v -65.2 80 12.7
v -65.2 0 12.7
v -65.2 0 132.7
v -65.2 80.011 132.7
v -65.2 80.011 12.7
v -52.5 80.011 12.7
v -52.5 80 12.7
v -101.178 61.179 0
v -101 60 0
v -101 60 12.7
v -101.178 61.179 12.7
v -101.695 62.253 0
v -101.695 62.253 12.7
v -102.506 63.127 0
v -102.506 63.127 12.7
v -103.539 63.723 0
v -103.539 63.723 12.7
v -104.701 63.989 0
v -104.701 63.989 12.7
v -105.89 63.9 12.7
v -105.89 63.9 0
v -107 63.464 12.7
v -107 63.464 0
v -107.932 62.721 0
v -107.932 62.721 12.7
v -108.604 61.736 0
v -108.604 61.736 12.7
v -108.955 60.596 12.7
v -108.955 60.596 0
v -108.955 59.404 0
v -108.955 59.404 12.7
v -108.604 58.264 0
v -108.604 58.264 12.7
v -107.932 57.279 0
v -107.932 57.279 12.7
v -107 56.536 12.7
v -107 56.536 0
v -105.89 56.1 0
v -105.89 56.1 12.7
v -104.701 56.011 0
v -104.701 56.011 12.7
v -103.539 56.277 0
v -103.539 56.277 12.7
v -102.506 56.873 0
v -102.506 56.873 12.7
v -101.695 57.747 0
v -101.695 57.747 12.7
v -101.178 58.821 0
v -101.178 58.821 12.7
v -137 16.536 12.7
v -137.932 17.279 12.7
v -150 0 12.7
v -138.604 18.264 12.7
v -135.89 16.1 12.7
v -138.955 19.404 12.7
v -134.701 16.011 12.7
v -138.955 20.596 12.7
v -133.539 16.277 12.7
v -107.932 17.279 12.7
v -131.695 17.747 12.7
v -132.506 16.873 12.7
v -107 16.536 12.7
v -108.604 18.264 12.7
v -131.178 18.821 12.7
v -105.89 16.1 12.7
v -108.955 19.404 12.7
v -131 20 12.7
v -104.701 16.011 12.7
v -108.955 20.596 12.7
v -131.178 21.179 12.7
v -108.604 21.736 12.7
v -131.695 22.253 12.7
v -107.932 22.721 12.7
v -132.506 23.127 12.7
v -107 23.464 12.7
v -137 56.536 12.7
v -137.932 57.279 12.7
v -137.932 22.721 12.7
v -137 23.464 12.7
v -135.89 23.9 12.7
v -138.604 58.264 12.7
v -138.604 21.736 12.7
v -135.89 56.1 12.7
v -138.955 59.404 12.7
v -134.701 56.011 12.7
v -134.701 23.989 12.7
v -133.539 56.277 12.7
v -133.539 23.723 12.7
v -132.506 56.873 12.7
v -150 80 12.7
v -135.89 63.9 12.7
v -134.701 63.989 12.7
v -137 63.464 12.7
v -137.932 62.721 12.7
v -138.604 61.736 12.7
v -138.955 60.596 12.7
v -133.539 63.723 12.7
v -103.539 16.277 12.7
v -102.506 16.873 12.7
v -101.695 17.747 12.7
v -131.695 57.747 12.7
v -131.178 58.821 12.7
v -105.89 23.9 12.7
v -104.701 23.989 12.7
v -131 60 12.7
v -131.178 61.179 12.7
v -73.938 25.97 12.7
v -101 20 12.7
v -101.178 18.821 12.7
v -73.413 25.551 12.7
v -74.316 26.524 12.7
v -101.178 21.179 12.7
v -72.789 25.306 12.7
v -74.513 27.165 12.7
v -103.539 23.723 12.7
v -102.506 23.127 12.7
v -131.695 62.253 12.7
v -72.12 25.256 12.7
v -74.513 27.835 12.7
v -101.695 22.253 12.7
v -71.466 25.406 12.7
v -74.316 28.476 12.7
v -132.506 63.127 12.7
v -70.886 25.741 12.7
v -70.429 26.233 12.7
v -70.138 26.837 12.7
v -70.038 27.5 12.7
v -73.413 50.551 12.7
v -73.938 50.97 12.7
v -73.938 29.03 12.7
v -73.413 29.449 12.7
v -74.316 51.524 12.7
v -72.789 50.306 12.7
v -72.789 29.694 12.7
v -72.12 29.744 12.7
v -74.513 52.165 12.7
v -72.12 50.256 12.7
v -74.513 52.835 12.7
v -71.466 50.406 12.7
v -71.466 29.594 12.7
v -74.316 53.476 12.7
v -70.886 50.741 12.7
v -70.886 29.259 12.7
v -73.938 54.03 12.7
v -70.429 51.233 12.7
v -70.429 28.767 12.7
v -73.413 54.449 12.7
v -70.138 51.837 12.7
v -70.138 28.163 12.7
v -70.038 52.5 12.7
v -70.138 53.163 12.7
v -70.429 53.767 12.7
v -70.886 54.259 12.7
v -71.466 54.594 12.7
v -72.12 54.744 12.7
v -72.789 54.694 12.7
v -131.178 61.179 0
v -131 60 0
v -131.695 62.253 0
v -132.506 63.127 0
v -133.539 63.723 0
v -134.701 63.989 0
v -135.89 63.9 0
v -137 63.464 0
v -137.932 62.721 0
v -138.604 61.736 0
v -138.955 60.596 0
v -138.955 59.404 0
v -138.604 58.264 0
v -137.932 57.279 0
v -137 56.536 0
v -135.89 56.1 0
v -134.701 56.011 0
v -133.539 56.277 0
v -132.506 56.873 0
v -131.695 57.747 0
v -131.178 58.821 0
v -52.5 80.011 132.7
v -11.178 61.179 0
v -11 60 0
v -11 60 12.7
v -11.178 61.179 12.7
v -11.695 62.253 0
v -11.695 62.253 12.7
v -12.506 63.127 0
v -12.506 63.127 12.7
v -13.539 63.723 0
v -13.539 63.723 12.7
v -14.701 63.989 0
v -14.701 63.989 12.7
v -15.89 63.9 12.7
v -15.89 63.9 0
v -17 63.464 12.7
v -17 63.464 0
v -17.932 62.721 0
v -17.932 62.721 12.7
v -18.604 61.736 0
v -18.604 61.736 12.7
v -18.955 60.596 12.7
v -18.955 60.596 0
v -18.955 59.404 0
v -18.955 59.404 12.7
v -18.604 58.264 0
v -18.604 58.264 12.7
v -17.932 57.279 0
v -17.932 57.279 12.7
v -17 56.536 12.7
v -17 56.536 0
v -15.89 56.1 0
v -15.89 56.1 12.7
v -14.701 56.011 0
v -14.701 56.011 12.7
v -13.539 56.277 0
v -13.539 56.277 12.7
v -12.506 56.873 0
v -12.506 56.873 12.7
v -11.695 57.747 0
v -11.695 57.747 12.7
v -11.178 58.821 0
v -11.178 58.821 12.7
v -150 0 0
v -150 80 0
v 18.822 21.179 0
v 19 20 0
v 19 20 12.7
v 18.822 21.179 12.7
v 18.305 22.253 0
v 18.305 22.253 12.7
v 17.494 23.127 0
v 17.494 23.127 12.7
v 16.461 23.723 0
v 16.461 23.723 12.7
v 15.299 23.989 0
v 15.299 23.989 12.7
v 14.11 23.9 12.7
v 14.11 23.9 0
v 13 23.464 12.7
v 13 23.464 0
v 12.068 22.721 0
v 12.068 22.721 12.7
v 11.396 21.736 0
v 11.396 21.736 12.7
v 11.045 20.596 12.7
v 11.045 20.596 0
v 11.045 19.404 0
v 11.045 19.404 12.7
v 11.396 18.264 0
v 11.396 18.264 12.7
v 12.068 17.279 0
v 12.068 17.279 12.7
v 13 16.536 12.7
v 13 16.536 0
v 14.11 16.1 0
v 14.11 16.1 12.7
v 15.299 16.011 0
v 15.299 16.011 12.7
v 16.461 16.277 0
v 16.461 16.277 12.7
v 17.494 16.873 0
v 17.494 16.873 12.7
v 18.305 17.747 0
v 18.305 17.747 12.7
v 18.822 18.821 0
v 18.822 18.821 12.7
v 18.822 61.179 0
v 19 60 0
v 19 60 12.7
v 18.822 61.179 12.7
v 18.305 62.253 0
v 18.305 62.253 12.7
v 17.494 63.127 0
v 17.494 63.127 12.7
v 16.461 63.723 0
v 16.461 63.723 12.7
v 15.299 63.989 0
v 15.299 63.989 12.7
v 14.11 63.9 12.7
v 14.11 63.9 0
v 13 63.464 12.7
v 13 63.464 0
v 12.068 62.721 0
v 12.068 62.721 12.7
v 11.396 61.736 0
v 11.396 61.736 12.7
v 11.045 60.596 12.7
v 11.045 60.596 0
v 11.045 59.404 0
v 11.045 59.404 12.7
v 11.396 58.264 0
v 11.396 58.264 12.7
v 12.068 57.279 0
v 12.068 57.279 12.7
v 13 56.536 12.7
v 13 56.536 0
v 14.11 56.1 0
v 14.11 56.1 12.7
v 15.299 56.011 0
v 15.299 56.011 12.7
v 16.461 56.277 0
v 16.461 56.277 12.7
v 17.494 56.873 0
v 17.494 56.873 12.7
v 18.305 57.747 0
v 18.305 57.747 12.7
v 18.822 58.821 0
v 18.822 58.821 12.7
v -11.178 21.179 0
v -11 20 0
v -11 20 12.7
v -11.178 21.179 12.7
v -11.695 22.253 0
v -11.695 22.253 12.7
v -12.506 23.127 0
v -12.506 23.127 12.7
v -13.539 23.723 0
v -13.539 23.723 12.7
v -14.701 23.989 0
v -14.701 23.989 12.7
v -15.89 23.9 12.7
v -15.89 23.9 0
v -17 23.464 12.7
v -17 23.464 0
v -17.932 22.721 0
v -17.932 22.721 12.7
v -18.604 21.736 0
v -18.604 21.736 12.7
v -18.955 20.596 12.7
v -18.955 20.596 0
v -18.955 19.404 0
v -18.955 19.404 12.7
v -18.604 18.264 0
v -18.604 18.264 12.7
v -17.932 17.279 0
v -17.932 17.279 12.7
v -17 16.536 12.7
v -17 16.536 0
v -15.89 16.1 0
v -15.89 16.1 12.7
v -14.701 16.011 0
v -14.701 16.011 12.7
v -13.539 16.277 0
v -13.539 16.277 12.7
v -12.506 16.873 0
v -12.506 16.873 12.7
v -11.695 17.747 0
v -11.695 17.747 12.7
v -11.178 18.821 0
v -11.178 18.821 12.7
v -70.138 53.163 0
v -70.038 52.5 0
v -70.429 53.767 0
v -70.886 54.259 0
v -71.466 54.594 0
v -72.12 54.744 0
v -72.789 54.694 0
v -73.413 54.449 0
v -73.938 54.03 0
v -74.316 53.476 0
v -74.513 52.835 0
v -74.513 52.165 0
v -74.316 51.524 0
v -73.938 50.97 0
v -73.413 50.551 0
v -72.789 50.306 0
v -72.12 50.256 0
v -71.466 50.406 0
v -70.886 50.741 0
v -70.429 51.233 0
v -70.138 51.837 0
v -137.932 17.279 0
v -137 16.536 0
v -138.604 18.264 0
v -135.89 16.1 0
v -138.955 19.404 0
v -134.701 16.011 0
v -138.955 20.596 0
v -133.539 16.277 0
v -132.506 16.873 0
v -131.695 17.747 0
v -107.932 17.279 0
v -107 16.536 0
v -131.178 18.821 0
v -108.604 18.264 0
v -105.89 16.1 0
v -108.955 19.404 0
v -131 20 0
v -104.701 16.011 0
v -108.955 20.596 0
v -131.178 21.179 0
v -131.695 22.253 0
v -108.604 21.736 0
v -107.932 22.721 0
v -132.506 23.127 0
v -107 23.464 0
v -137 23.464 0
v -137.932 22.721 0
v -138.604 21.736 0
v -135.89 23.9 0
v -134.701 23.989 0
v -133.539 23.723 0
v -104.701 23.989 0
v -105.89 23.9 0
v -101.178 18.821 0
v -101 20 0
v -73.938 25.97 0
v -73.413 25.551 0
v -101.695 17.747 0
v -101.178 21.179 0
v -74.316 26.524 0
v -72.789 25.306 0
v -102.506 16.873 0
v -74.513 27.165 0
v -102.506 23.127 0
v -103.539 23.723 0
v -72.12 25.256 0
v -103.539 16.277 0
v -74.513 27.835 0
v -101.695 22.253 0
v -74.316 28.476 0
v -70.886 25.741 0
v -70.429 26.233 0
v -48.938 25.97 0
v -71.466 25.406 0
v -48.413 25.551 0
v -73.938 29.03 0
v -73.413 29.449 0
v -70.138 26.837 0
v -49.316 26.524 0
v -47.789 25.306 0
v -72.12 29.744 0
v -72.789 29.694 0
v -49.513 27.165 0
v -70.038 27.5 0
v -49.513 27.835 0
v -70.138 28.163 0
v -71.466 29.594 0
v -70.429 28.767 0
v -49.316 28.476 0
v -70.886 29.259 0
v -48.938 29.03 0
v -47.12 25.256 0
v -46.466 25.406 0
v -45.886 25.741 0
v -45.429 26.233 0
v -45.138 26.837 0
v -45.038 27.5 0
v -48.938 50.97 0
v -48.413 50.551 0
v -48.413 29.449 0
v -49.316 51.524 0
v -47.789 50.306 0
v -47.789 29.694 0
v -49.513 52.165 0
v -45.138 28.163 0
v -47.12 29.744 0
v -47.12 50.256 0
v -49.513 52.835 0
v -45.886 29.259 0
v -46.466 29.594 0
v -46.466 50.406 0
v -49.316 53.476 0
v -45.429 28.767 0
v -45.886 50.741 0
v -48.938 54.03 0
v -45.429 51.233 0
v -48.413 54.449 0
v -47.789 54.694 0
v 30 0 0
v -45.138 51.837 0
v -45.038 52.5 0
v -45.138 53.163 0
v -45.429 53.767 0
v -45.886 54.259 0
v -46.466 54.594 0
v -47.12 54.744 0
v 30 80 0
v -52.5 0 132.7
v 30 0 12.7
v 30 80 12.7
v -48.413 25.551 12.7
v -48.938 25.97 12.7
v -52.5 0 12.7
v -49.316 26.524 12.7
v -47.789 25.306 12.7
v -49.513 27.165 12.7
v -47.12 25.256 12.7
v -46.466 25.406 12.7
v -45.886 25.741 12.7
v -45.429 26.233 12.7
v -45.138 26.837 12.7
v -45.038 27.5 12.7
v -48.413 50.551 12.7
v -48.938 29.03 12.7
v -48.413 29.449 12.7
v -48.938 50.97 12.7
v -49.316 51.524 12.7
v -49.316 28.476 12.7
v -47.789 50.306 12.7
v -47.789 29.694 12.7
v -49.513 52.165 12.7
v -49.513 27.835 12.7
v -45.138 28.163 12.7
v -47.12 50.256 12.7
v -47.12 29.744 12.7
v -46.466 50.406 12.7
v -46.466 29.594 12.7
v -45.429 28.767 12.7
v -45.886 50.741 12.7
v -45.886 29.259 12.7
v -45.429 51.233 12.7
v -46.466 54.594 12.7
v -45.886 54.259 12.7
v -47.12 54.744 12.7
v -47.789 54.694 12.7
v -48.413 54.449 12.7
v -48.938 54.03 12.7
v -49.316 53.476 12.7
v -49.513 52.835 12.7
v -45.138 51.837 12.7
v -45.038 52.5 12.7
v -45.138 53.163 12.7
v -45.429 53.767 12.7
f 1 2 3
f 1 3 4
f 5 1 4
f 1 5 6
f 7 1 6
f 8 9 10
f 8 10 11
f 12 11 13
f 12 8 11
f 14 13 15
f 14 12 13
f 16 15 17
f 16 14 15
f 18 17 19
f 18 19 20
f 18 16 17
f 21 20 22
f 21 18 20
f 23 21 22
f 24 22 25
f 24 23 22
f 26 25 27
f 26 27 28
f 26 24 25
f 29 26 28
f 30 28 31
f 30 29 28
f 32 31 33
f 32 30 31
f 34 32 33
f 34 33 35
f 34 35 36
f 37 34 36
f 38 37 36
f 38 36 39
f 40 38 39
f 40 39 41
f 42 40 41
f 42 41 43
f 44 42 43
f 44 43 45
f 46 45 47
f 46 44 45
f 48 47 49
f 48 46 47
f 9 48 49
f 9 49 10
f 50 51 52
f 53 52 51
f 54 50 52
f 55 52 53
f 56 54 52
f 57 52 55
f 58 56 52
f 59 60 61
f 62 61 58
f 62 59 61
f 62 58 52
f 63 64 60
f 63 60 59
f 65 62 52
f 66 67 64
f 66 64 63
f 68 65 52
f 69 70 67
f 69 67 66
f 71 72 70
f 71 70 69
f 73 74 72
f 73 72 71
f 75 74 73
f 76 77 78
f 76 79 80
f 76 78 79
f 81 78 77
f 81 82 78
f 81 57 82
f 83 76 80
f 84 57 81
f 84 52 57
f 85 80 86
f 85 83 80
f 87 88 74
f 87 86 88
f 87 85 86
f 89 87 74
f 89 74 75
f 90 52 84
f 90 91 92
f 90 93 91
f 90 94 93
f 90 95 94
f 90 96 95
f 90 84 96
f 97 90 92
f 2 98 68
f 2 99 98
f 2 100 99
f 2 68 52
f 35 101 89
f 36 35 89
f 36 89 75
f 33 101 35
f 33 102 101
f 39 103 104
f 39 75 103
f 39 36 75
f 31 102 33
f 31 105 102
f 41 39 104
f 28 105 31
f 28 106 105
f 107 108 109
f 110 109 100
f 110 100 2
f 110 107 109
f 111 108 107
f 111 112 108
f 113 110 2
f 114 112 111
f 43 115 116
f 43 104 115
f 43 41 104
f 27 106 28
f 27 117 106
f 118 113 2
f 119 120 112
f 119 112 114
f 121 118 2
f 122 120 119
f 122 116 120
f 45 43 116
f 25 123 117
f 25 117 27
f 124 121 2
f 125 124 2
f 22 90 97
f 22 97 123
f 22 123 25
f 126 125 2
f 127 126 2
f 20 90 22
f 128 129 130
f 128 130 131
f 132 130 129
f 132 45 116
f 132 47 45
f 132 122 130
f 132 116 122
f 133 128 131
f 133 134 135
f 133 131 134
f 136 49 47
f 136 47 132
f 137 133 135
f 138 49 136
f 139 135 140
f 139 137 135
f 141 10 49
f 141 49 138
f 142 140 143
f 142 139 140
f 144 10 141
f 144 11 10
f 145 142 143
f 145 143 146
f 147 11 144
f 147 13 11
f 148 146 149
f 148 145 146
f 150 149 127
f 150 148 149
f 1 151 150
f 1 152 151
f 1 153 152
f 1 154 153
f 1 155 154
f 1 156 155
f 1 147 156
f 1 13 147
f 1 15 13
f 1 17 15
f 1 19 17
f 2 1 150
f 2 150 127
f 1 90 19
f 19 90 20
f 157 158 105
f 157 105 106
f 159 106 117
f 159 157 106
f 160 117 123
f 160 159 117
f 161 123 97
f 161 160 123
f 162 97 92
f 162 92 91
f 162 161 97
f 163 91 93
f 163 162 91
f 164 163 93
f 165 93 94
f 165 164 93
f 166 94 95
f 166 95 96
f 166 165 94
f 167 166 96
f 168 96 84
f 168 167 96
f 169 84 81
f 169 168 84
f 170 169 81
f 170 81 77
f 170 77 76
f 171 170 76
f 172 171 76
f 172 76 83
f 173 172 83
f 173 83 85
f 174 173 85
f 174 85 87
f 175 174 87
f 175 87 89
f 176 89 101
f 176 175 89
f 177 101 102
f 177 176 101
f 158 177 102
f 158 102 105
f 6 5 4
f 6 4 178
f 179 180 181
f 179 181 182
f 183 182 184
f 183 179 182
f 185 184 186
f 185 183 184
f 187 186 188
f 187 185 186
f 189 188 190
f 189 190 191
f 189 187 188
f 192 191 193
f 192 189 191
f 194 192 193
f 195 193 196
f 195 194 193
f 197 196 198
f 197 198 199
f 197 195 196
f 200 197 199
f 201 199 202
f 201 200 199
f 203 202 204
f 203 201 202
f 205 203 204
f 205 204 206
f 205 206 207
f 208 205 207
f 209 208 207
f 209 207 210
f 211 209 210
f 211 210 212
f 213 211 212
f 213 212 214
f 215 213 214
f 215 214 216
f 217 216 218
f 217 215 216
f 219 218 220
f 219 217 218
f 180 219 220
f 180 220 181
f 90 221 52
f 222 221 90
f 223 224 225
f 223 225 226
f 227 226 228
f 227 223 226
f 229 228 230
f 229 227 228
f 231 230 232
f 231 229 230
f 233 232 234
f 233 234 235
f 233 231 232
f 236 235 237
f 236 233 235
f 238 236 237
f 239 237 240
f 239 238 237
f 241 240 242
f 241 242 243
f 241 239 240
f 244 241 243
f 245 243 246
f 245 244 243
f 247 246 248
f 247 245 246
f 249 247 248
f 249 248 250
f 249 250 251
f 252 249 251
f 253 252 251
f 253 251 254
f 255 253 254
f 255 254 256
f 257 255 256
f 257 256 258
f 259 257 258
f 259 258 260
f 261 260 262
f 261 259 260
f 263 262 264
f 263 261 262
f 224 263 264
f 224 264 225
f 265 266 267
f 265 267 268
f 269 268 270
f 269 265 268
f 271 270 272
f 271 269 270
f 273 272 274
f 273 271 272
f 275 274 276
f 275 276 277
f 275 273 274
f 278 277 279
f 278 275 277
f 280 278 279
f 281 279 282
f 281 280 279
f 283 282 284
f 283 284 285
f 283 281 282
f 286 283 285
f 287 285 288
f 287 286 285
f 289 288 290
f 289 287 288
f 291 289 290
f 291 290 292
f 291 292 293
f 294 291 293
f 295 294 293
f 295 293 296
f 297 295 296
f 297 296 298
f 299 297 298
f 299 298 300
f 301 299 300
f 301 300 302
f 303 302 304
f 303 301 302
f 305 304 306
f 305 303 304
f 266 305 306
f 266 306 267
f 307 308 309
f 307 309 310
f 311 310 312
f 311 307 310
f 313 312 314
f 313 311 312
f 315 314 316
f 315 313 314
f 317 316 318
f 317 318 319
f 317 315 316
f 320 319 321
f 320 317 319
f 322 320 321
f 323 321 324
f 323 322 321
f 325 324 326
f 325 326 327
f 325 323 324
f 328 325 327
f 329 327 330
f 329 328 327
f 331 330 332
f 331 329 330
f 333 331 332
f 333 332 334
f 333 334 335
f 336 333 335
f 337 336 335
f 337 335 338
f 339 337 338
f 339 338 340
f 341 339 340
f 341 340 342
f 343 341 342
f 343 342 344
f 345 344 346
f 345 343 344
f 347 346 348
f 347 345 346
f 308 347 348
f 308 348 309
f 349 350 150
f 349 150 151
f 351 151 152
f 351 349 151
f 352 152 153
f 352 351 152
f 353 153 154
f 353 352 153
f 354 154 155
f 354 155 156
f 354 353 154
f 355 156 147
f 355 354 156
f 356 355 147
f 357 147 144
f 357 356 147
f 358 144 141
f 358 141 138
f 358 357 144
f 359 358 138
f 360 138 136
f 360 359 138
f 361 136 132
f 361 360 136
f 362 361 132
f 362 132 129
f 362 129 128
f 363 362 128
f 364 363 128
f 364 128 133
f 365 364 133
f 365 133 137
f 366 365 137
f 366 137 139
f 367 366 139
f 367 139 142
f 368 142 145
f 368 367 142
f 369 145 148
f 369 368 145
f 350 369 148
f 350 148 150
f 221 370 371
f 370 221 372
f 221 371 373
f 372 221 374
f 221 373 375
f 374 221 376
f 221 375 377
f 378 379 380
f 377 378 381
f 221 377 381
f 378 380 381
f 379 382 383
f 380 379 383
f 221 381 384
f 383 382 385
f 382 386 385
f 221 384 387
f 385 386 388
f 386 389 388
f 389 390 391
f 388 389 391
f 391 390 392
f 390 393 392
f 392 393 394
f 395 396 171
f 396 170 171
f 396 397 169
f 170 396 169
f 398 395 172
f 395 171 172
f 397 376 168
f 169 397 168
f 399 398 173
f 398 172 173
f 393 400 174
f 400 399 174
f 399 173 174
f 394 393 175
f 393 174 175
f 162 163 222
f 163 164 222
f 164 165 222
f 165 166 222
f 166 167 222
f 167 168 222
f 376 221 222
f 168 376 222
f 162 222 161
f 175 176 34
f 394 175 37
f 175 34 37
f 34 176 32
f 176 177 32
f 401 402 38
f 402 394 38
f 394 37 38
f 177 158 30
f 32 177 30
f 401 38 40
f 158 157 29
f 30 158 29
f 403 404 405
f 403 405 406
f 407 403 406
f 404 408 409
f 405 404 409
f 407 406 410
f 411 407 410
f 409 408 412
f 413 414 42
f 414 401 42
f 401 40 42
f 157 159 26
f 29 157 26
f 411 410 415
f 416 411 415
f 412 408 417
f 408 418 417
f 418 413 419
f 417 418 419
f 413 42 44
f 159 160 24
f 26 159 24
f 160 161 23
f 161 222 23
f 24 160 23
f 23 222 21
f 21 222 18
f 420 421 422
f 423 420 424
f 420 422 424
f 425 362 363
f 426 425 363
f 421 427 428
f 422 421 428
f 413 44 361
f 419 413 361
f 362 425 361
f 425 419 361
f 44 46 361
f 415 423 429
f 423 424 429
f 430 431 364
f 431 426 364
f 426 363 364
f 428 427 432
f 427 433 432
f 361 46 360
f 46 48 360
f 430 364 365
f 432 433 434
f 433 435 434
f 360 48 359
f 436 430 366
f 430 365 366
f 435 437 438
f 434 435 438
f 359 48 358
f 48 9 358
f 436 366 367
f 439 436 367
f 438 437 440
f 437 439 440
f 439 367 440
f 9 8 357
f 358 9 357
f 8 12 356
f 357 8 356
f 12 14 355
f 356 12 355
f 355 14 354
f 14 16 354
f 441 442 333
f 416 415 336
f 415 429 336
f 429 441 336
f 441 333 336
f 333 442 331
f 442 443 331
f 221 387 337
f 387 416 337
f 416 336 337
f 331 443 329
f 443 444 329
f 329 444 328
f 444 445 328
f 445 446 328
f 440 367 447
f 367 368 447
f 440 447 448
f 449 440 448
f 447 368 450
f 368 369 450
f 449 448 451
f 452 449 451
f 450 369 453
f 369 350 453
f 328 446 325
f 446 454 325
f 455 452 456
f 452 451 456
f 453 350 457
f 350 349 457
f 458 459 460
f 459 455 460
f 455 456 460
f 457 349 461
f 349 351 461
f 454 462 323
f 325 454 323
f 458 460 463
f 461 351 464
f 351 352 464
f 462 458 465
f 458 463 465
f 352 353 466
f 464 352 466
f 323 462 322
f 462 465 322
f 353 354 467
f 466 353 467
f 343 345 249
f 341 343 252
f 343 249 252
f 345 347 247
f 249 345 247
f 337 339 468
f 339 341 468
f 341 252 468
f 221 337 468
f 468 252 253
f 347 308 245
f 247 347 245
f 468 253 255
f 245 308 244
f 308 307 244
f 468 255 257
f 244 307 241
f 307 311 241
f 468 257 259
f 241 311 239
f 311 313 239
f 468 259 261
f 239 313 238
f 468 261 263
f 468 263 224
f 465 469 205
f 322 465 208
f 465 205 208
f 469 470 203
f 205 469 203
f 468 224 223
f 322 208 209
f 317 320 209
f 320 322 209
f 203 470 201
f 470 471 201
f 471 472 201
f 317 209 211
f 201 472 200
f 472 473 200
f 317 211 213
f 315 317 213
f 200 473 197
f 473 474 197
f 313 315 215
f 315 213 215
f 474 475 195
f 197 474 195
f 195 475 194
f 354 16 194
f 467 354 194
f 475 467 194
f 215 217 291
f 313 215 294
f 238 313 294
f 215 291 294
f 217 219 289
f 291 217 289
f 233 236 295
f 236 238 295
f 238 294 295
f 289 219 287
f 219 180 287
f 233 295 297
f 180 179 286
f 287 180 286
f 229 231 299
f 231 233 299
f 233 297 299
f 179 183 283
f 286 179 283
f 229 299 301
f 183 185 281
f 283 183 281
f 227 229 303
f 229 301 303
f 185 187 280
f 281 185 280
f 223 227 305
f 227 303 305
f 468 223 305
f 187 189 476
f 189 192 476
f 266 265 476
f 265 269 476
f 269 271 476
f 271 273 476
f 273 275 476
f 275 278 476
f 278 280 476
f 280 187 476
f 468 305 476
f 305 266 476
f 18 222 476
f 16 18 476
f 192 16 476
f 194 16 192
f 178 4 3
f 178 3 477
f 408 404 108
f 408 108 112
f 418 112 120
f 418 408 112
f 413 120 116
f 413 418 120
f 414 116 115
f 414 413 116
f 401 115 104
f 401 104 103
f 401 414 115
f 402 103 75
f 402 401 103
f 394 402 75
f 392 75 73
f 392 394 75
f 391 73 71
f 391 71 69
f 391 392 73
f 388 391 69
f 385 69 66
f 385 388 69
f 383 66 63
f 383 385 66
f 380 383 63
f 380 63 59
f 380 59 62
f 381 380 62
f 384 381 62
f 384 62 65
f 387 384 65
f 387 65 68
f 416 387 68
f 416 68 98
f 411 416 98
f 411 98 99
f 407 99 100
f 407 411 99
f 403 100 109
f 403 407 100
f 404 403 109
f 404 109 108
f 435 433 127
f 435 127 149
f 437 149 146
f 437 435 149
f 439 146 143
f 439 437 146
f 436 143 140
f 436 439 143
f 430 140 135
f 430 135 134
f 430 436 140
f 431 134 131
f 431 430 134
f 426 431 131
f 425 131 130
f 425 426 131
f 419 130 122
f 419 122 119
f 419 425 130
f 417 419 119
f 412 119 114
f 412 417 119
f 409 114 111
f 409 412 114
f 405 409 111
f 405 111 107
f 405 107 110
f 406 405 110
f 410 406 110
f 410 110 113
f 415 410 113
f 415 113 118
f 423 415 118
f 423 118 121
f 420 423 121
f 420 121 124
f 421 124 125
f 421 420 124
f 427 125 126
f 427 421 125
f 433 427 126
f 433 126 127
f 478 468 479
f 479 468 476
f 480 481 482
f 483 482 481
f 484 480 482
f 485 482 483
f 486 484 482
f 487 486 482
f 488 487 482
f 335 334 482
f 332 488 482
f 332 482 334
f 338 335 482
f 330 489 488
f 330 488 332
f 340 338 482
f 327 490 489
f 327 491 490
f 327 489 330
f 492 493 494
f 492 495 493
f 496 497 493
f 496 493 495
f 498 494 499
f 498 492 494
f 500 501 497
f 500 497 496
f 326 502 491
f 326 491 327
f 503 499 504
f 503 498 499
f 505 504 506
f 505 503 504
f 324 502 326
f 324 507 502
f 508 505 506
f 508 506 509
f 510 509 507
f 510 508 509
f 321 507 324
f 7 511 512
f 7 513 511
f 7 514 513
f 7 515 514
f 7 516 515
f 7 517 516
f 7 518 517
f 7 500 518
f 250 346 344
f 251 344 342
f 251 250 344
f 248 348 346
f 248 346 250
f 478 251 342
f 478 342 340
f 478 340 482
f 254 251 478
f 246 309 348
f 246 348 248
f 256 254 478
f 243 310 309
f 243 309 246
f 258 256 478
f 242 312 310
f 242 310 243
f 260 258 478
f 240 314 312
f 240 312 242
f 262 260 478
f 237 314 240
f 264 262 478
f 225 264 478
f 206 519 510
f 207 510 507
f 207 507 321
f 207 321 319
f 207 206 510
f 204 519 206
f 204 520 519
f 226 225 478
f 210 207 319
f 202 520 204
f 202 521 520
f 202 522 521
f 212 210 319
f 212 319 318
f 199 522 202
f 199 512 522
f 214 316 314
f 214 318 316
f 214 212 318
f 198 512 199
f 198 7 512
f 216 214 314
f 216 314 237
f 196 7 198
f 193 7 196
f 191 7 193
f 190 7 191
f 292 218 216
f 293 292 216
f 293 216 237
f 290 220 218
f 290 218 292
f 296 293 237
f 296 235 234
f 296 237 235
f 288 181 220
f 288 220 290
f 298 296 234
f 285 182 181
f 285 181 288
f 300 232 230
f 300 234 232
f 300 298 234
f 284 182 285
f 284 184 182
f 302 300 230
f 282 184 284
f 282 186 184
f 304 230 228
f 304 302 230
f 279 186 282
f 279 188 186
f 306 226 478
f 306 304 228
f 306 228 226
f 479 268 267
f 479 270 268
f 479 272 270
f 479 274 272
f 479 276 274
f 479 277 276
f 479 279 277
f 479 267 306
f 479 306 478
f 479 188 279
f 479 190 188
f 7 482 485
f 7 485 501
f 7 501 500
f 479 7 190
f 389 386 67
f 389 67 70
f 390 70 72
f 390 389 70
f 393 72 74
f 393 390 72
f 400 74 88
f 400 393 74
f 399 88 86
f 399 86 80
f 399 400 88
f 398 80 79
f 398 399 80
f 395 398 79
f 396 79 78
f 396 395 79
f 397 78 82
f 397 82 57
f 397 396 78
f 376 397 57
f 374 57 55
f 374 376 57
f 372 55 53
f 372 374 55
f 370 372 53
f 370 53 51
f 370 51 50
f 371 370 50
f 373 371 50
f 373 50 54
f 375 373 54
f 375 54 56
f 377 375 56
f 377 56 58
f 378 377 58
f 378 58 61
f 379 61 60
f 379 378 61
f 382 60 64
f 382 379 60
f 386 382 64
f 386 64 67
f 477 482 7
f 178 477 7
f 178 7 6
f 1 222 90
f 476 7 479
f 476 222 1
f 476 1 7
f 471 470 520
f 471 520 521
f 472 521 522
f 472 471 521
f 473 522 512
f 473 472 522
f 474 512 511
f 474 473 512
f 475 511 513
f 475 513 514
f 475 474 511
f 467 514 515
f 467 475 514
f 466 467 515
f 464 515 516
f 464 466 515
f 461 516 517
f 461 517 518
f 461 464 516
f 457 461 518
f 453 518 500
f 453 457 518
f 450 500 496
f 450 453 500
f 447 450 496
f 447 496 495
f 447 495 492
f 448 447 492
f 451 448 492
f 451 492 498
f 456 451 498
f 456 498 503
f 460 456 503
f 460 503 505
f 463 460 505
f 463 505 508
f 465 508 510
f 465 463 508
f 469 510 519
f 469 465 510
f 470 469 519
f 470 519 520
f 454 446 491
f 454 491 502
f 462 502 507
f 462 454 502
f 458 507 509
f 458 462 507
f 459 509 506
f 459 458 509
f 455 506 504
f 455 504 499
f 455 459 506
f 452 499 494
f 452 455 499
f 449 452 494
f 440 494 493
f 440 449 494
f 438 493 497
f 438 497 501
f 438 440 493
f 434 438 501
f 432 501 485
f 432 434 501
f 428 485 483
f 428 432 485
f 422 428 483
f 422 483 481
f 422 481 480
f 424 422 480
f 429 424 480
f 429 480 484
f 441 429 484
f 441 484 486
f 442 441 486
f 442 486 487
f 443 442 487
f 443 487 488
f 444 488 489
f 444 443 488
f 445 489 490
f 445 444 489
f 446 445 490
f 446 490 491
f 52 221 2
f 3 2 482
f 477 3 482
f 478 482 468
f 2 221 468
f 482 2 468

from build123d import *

# Parameters (mm, degrees)
CROQUIS1_W              = 180
CROQUIS1_H              = 80
CROQUIS1_R              = 4
CROQUIS1_R_2            = 2.25
SALIENTE_EXTRUIR1_DEPTH = 12.7
CROQUIS2_W              = 12.7
CROQUIS2_H              = 80.011204884
SALIENTE_EXTRUIR2_DEPTH = 120


with BuildPart() as part:
    # Croquis1 → Saliente-Extruir1 (new body)
    with BuildSketch(Plane.XY):
        with Locations((-60, 40)):
            Rectangle(CROQUIS1_W, CROQUIS1_H)
        with Locations((15, 20)):
            Circle(CROQUIS1_R, mode=Mode.SUBTRACT)
        with Locations((-15, 20)):
            Circle(CROQUIS1_R, mode=Mode.SUBTRACT)
        with Locations((15, 60)):
            Circle(CROQUIS1_R, mode=Mode.SUBTRACT)
        with Locations((-15, 60)):
            Circle(CROQUIS1_R, mode=Mode.SUBTRACT)
        with Locations((-105, 20)):
            Circle(CROQUIS1_R, mode=Mode.SUBTRACT)
        with Locations((-135, 20)):
            Circle(CROQUIS1_R, mode=Mode.SUBTRACT)
        with Locations((-135, 60)):
            Circle(CROQUIS1_R, mode=Mode.SUBTRACT)
        with Locations((-105, 60)):
            Circle(CROQUIS1_R, mode=Mode.SUBTRACT)
        with Locations((-72.288485416, 27.5)):
            Circle(CROQUIS1_R_2, mode=Mode.SUBTRACT)
        with Locations((-72.288485416, 52.5)):
            Circle(CROQUIS1_R_2, mode=Mode.SUBTRACT)
        with Locations((-47.288485416, 52.5)):
            Circle(CROQUIS1_R_2, mode=Mode.SUBTRACT)
        with Locations((-47.288485416, 27.5)):
            Circle(CROQUIS1_R_2, mode=Mode.SUBTRACT)
    extrude(amount=SALIENTE_EXTRUIR1_DEPTH)

    # Croquis2 → Saliente-Extruir2 (add)
    with BuildSketch(Plane.XY.offset(12.7)):
        with Locations((-58.85, 40.005602442)):
            Rectangle(CROQUIS2_W, CROQUIS2_H)
    extrude(amount=SALIENTE_EXTRUIR2_DEPTH)


solid = part.part
